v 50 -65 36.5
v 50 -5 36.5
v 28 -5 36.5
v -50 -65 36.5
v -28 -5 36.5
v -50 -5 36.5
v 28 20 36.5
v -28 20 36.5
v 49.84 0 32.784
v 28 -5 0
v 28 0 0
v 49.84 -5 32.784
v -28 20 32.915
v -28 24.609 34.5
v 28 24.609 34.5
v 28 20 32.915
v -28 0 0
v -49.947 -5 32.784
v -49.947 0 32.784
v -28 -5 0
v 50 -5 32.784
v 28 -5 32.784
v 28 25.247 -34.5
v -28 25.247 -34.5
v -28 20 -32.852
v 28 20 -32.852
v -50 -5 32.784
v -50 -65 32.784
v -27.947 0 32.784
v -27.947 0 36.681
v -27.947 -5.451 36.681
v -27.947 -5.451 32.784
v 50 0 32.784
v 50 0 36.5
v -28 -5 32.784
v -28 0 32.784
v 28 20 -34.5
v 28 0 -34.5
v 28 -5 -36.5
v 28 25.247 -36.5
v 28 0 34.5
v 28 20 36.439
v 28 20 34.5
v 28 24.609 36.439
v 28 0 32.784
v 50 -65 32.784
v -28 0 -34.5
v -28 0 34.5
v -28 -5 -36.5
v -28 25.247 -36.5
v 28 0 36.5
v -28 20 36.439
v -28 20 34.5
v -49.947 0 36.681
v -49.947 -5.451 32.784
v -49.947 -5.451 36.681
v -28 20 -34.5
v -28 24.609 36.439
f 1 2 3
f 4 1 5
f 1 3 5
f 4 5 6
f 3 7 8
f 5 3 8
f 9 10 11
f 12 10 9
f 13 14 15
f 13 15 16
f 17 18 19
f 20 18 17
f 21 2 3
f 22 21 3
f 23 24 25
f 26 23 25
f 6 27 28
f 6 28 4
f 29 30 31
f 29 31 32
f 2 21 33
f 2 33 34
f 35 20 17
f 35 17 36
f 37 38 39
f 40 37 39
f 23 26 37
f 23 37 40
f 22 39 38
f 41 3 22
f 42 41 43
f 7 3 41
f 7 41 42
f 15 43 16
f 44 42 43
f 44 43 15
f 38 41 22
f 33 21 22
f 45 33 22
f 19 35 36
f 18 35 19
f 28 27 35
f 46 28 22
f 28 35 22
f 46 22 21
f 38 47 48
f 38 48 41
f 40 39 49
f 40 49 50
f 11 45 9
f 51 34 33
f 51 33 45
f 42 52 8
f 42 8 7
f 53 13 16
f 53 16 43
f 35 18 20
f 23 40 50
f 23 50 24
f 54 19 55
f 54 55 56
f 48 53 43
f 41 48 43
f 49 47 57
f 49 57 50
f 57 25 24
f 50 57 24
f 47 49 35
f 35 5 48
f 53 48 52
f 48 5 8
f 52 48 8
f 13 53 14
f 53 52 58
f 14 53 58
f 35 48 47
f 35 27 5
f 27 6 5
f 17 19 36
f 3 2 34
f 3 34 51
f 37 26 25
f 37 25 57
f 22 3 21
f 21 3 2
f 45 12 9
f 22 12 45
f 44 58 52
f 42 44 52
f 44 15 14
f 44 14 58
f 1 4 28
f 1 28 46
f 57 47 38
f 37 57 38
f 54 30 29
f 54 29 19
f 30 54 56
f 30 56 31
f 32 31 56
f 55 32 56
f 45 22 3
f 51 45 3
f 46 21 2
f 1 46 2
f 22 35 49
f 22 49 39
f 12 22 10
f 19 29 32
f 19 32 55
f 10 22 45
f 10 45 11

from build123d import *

# Parameters (mm, degrees)
F0_W      = 56
F0_H      = 69
F1_DEPTH  = 5
F2_W      = 56
F2_H      = 20
F2_H_2    = 5
F3_DEPTH  = 2
F4_W      = 4.6087592095
F4_H      = 1.93925488
F5_DEPTH  = 56
F6_W      = 56
F6_H      = 20
F6_H_2    = 5
F7_DEPTH  = 2
F8_W      = 5.2468083054
F8_H      = 2
F9_DEPTH  = 56
F10_W     = 22
F10_H     = 3.7164769792
F10_W_2   = 56
F11_DEPTH = 60
F13_DEPTH = 5
F15_DEPTH = 5.45125
F16_W     = 22
F16_H     = 3.7164769792
F17_DEPTH = 5


with BuildPart() as f1:
    # F0 (on Front) → F1 (new body)
    with BuildSketch(Plane.XZ):
        Rectangle(F0_W, F0_H)
    extrude(amount=F1_DEPTH)

    # F2 (on face) → F3 (join)
    with BuildSketch(Plane.XY.offset(34.5)):
        with Locations((0, 10)):
            Rectangle(F2_W, F2_H)
        with Locations((0, -2.5)):
            Rectangle(F2_W, F2_H_2)
    extrude(amount=F3_DEPTH)

    # F4 (on face) → F5 (join)
    with BuildSketch(Plane(origin=(-28, 0, 0), x_dir=(0, -1, 0), z_dir=(-1, 0, 0))):
        Polygon((-20, 32.9149998724), (-20, 34.5), (-24.6087592095, 34.5), align=None)
        with Locations((-22.3043796048, 35.46962744)):
            Rectangle(F4_W, F4_H)
    extrude(amount=-F5_DEPTH)

    # F6 (on face) → F7 (join)
    with BuildSketch(Plane(origin=(0, 0, -34.5), x_dir=(1, 0, 0), z_dir=(0, 0, -1))):
        with Locations((0, -10)):
            Rectangle(F6_W, F6_H)
        with Locations((0, 2.5)):
            Rectangle(F6_W, F6_H_2)
    extrude(amount=F7_DEPTH)

    # F8 (on face) → F9 (join)
    with BuildSketch(Plane.YZ.offset(28)):
        Polygon((20, -32.851787871), (20, -34.5), (25.2468083054, -34.5), align=None)
        with Locations((22.6234041527, -35.5)):
            Rectangle(F8_W, F8_H)
    extrude(amount=-F9_DEPTH)

    # F10 (on face) → F11 (join)
    with BuildSketch(Plane.XZ.offset(5)):
        with Locations((39, 34.6417615104)):
            Rectangle(F10_W, F10_H)
        with Locations((0, 34.6417615104)):
            Rectangle(F10_W_2, F10_H)
        with Locations((-39, 34.6417615104)):
            Rectangle(F10_W, F10_H)
    extrude(amount=F11_DEPTH)


with BuildPart() as f13:
    # F12 (on face) → F13 (new body)
    with BuildSketch(Plane.XZ.offset(5)):
        Polygon((49.8404502869, 32.7835230208), (28, 32.7835230208), (28, 0), align=None)
    extrude(amount=-F13_DEPTH)


with BuildPart() as f13b:
    # F12 (on face) → F13, piece 2 (new body)
    with BuildSketch(Plane.XZ.offset(5)):
        Polygon((-28, 0), (-28, 32.7835230208), (-49.9470122159, 32.7835230208), align=None)
    extrude(amount=-F13_DEPTH)


with BuildPart() as f15:
    # F14 (on face) → F15 (new body)
    with BuildSketch(Plane(origin=(0, 0, 0), x_dir=(-1, 0, 0), z_dir=(0, 1, 0))):
        Polygon((28, 32.7835230208), (49.9470122159, 32.7835230208), (49.9470122159, 36.680599041), (27.9470122159, 36.680599041), (27.9470122159, 32.7835230208), align=None)
    extrude(amount=-F15_DEPTH)


with BuildPart() as f17:
    # F16 (on face) → F17 (new body)
    with BuildSketch(Plane(origin=(0, -5, 0), x_dir=(-1, 0, 0), z_dir=(0, 1, 0))):
        with Locations((-39, 34.6417615104)):
            Rectangle(F16_W, F16_H)
    extrude(amount=F17_DEPTH)


solid = Compound([f1.part, f13.part, f13b.part, f15.part, f17.part])
